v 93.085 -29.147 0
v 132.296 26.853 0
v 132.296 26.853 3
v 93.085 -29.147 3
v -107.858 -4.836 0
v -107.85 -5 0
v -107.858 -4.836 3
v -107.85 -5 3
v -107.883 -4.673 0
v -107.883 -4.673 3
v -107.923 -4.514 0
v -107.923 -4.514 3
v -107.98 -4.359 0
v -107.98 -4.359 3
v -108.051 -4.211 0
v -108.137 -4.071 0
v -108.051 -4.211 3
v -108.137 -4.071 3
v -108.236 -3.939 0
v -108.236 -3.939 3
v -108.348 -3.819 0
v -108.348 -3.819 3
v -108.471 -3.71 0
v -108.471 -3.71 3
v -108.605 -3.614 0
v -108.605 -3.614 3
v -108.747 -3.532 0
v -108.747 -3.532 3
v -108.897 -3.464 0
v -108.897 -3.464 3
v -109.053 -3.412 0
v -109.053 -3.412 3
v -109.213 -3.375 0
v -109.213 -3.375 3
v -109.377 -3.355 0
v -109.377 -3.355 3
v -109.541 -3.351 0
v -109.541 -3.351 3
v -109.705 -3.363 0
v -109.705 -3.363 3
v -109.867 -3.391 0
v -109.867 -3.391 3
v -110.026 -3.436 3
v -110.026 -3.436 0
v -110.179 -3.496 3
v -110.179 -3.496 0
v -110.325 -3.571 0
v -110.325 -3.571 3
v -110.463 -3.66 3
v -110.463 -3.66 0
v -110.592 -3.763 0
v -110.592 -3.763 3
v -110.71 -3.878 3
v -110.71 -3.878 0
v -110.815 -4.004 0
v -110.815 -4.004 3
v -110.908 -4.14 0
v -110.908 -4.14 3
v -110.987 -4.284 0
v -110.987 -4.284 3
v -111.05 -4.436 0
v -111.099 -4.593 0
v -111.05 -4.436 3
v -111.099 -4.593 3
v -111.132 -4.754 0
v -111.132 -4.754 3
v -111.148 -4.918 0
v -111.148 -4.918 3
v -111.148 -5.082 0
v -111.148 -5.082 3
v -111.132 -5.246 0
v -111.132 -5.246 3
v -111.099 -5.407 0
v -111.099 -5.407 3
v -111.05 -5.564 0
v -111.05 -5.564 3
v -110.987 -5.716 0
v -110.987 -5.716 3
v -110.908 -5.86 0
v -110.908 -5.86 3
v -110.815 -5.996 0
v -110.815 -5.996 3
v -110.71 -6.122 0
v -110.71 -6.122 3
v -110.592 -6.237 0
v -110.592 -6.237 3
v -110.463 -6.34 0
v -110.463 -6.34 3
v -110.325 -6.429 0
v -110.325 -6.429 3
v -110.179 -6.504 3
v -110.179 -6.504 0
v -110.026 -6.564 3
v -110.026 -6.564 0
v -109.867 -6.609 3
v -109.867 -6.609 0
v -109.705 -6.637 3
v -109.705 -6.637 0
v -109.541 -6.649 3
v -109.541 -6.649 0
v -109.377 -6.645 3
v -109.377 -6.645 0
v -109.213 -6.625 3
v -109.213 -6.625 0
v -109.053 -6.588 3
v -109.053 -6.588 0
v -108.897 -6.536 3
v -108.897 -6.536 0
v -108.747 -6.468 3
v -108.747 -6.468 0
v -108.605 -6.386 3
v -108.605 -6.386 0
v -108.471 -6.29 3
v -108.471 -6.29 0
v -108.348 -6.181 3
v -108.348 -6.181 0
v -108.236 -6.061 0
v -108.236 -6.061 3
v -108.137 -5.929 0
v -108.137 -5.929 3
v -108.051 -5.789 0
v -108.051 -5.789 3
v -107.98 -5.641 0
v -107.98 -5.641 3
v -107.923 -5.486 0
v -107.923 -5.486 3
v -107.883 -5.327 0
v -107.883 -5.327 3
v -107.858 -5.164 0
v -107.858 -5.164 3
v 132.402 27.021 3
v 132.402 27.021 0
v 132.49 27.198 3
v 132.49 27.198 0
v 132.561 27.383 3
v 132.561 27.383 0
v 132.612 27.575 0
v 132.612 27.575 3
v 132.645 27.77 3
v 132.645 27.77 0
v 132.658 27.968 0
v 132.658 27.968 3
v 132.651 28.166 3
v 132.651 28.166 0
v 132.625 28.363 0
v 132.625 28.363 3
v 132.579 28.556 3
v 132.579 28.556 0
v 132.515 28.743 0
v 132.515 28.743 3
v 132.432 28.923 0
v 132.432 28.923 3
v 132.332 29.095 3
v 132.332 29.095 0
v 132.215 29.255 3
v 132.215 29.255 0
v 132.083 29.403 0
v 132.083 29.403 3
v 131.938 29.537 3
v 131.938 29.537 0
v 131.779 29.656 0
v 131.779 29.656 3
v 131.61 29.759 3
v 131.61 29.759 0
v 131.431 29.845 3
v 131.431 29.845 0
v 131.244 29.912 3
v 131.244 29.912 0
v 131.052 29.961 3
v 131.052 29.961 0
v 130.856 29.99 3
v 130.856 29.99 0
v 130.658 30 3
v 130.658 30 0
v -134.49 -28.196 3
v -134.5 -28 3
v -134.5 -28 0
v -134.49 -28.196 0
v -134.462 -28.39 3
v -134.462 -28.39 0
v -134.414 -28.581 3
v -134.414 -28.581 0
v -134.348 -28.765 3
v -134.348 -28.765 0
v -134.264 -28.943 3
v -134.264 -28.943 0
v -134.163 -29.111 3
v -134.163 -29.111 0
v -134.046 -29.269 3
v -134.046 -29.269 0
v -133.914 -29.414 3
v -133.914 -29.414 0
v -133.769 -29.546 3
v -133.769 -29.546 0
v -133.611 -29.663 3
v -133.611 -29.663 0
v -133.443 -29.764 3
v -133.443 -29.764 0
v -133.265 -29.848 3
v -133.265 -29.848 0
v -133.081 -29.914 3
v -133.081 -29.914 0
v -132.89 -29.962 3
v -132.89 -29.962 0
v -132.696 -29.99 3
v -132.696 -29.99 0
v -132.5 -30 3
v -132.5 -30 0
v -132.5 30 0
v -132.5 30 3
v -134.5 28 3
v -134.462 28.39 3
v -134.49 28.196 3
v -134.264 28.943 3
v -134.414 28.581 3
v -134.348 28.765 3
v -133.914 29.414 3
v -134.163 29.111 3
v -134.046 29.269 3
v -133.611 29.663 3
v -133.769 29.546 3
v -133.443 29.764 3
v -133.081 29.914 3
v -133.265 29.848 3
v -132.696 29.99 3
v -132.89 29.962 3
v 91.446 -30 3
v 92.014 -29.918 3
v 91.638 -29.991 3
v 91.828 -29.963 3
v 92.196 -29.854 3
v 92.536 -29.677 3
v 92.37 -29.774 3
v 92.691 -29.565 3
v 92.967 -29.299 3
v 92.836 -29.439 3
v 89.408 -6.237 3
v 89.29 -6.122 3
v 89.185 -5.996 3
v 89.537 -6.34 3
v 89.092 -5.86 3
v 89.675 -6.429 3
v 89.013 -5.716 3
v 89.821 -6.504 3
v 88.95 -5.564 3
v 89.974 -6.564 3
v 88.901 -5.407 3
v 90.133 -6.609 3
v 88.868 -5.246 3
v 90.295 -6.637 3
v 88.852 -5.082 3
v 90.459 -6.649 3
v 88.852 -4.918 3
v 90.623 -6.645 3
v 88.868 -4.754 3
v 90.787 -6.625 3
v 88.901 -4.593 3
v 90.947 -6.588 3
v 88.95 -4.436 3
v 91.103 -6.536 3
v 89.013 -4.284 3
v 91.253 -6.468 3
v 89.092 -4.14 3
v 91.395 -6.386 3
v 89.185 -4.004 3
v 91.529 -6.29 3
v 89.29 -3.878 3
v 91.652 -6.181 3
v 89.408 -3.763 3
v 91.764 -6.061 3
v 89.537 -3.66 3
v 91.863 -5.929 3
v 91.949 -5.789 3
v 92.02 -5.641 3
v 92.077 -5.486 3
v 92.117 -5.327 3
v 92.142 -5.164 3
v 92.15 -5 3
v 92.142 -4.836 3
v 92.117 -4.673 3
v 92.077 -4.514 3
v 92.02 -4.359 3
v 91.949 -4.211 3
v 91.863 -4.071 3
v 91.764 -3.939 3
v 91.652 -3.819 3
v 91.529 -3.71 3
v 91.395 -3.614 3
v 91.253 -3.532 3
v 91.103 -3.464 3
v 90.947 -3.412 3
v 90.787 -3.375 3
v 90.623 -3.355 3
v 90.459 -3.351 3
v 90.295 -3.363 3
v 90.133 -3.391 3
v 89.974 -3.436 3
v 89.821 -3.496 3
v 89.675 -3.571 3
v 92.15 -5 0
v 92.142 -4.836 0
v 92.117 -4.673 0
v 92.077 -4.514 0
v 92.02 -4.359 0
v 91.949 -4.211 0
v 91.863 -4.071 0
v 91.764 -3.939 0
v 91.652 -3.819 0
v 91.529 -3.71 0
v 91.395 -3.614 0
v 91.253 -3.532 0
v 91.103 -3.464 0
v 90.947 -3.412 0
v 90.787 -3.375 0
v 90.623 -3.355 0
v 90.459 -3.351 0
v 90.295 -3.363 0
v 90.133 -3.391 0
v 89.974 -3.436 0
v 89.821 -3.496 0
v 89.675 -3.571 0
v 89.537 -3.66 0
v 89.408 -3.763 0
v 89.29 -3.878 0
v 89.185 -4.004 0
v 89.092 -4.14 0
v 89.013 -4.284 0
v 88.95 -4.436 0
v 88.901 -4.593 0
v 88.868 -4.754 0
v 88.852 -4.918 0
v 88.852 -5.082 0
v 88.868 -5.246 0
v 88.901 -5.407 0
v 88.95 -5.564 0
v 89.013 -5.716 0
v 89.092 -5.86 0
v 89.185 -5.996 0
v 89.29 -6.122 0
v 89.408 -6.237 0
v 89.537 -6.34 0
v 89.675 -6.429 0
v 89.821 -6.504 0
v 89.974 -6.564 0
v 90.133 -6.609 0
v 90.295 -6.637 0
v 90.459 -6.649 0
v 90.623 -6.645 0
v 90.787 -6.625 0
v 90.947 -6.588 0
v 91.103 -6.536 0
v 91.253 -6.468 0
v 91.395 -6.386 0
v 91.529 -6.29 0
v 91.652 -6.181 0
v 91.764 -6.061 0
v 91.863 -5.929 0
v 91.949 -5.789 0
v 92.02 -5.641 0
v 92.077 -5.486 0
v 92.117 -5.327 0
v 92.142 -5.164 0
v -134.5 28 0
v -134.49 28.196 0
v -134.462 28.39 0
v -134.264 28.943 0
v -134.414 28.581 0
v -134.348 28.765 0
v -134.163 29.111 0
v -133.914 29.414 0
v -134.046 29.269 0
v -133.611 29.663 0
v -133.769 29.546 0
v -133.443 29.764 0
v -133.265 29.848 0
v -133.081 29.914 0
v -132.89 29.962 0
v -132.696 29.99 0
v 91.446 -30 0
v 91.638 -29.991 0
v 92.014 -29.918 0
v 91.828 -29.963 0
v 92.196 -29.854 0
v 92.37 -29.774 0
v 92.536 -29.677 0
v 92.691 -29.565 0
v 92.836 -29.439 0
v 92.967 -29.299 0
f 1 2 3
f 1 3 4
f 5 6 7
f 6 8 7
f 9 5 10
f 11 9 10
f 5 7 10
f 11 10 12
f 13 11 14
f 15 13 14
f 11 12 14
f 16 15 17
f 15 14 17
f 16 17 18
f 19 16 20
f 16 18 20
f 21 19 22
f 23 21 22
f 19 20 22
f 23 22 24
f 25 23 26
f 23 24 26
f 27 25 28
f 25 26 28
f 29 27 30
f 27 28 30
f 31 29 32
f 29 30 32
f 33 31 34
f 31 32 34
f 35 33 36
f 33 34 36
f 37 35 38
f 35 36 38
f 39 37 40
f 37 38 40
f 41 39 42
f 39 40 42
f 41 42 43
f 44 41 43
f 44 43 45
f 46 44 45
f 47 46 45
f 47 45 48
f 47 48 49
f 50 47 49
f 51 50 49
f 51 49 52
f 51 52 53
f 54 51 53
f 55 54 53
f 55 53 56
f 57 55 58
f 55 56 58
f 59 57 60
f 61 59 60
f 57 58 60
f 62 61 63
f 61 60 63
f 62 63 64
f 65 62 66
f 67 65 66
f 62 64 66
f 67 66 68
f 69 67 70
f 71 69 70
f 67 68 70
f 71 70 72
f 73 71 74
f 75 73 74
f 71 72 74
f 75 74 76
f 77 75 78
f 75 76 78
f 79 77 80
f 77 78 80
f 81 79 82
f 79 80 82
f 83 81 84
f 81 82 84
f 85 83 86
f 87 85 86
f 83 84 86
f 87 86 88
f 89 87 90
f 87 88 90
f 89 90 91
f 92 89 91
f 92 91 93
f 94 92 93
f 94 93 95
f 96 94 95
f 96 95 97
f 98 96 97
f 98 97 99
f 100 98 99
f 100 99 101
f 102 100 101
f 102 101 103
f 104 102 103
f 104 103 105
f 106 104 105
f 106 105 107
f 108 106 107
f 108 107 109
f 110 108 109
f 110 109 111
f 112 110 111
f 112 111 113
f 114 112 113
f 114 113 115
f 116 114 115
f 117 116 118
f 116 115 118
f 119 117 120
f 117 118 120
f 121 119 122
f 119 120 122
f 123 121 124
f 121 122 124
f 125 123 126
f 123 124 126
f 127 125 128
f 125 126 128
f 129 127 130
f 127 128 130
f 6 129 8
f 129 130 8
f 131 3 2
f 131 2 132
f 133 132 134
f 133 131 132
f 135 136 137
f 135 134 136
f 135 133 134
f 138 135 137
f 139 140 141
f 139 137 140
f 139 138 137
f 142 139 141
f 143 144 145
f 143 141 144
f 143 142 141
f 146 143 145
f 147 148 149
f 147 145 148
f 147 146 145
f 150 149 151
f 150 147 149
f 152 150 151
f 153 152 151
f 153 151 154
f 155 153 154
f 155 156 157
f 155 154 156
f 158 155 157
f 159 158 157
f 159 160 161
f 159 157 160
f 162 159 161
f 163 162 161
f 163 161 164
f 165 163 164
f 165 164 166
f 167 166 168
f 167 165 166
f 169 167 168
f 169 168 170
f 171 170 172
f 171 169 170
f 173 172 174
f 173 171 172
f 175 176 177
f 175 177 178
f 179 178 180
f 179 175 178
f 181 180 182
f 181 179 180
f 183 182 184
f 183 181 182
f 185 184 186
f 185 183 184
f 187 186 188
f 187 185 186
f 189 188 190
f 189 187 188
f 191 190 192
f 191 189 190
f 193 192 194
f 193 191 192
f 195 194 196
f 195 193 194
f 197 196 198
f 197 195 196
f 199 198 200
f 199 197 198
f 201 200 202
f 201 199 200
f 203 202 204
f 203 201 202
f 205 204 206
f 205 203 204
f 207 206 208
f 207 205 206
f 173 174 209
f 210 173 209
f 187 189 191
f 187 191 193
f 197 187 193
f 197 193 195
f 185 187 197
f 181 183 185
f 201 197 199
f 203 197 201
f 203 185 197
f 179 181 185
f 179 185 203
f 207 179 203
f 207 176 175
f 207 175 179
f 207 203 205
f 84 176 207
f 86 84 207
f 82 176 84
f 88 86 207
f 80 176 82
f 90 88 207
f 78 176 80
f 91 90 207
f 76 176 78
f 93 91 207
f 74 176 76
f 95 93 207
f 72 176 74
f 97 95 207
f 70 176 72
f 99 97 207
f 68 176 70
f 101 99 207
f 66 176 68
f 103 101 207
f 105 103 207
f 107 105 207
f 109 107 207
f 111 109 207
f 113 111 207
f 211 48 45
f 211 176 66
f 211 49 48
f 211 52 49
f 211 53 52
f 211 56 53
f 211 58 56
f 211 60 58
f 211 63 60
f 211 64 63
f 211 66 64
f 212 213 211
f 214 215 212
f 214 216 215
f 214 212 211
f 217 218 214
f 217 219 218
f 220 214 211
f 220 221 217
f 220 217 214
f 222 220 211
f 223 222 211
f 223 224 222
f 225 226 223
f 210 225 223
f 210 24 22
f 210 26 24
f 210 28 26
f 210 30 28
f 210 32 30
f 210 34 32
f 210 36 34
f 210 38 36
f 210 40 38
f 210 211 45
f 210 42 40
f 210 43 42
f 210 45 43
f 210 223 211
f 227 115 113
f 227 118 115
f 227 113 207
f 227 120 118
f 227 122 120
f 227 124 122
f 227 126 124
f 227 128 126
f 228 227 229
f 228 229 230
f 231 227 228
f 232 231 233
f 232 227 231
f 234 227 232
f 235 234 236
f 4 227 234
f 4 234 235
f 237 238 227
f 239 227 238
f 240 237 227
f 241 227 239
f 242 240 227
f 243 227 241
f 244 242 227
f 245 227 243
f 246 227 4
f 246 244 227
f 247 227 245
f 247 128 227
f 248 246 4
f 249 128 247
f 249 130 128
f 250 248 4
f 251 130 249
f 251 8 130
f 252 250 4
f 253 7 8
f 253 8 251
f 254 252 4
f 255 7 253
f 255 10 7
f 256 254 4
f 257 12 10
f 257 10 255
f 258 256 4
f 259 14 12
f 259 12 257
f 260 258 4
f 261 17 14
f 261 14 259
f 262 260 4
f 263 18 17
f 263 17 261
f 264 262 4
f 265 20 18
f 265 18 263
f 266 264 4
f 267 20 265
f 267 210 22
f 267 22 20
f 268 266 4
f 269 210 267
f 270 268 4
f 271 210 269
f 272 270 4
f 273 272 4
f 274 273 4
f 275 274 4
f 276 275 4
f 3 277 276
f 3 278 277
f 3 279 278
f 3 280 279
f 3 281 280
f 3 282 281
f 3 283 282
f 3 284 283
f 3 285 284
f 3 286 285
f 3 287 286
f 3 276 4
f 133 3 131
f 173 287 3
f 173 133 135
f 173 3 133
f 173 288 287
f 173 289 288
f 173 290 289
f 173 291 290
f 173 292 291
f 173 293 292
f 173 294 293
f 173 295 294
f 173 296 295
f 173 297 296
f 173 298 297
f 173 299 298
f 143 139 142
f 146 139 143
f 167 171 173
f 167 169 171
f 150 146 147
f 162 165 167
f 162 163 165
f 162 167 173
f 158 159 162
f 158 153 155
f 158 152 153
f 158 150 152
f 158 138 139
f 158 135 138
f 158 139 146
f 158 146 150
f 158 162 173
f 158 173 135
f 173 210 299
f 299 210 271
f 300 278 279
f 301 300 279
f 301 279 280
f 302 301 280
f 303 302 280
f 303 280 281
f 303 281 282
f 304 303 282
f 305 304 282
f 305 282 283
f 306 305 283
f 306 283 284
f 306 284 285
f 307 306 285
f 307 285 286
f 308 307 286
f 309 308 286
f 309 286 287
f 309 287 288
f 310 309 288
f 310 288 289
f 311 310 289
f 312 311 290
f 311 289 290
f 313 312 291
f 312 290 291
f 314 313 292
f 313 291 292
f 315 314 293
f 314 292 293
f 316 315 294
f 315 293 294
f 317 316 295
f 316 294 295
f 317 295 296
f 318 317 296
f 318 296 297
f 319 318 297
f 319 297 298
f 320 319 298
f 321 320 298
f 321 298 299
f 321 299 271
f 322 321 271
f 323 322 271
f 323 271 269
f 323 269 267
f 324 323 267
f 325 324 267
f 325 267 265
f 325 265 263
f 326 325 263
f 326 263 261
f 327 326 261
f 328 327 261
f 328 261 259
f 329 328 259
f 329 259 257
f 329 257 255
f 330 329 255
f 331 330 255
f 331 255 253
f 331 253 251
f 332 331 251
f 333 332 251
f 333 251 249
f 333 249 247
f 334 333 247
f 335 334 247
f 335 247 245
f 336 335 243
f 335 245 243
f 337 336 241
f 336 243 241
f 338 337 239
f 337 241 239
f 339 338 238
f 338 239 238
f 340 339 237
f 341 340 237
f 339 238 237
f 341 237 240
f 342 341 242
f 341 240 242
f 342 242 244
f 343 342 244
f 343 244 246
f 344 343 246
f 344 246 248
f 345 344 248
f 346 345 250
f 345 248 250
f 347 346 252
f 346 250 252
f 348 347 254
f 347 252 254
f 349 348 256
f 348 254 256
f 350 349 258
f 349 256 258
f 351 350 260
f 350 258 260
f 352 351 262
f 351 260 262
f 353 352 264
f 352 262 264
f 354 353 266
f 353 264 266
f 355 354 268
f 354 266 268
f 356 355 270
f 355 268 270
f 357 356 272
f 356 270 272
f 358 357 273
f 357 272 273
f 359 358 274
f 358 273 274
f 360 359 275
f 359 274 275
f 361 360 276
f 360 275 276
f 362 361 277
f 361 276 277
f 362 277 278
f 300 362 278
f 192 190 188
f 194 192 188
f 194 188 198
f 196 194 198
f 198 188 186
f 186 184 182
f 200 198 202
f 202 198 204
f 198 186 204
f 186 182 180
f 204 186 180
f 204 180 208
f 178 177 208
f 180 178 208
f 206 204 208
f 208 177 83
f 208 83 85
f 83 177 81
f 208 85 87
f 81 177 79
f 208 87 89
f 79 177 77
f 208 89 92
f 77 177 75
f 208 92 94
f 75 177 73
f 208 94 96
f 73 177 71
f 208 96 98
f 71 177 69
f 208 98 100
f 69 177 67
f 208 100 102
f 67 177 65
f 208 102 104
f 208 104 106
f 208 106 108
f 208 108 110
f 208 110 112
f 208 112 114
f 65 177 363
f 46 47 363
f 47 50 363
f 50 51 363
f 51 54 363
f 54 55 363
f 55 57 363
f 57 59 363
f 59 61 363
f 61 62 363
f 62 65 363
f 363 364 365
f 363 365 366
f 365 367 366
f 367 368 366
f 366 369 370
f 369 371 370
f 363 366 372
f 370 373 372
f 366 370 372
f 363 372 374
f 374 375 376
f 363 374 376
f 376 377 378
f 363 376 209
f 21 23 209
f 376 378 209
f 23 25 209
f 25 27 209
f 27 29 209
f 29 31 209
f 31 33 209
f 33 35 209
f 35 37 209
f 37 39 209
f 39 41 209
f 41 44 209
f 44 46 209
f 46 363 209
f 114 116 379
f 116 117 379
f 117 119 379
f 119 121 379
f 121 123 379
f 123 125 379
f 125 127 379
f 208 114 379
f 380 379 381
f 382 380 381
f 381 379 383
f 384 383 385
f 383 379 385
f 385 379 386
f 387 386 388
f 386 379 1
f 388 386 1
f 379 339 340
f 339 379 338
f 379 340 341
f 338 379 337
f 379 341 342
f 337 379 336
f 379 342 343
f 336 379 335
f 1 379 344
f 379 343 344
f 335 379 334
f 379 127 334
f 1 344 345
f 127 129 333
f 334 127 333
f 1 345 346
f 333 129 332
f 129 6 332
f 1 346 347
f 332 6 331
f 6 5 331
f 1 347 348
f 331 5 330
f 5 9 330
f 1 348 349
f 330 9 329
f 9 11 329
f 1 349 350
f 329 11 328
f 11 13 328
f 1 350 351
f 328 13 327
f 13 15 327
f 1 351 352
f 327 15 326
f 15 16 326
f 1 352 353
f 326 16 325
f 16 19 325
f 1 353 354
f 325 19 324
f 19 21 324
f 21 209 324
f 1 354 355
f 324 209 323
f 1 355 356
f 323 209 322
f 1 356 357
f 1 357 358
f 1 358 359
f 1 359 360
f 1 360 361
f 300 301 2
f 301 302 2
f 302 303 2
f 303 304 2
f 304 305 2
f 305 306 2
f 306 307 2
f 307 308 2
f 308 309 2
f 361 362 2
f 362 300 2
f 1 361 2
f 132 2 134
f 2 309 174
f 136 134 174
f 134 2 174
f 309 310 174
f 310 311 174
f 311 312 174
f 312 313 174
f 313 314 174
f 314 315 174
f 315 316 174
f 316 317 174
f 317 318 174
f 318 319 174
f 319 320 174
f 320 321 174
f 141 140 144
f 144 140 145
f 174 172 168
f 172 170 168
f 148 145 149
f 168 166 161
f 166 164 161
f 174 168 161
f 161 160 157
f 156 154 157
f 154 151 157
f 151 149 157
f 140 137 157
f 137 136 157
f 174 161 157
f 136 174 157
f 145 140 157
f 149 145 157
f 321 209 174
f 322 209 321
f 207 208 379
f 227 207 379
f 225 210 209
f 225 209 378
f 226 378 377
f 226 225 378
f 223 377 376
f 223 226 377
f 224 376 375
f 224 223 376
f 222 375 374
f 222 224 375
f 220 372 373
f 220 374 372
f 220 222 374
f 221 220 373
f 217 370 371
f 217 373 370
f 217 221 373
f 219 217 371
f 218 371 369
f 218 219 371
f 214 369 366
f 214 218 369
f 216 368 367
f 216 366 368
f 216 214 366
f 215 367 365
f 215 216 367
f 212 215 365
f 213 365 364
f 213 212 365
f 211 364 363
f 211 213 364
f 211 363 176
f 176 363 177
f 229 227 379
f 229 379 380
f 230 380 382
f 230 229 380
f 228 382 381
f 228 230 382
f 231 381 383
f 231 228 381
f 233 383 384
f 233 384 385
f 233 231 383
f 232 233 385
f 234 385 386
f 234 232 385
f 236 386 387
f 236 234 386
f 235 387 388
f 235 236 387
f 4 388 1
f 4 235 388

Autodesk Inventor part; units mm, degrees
ref_plane "YZ Plane" through (0, 0, 0) normal (1, 0, 0) x (0, 1, 0)
ref_plane "XZ Plane" through (0, 0, 0) normal (0, 1, 0) x (-1, 0, 0)
ref_plane "XY Plane" through (0, 0, 0) normal (0, 0, 1) x (1, 0, 0)
sketch "Sketch1" plane through (0, 0, 0) normal (0, 0, 1) x (1, 0, 0)
  line L0 (-134.5, -30) -> (134.5, -30)
  line L1 (134.5, -30) -> (134.5, 30)
  line L2 (134.5, 30) -> (-134.5, 30)
  line L3 (-134.5, 30) -> (-134.5, -30)
  line L4 (-134.5, -30) -> (134.5, 30) construction
  line L5 (134.5, -30) -> (-134.5, 30) construction
  line L6 (134.5, 30) -> (92.4875, -30)
  point P0 (0, 0)
  dimension "d0" = 269
  dimension "d1" = 60
  dimension "d2" = 55
extrude "Extrusion1" add sketch "Sketch1" along normal blind 3 contours L3 L2 L6 L0
sketch "Sketch2" plane through (0, 0, 3) normal (0, 0, 1) x (1, 0, 0)
  circle A0 centre (-109.5, -5) radius 1.65
  line L0 (-134.5, -30) -> (92.4875, -30) projected
  line L1 (-134.5, 30) -> (-134.5, -30) projected
  line L2 (-109.5, -5) -> (151.1099, -5) construction
  circle A1 centre (90.5, -5) radius 1.65
  point P0 (0, 0)
  dimension "d5" = 25
  dimension "d6" = 3.3
  dimension "d7" = 25
  dimension "d8" = 225
  dimension "d9" = 3.3
extrude "Extrusion2" cut sketch "Sketch2" against normal through all
fillet "Fillet1" radius 2 4 edges at (-134.5, 30, 1.5) (-134.5, -30, 1.5) (92.4875, -30, 1.5) (134.5, 30, 1.5)
sketch "Sketch3" plane through (0, 0, 3) normal (0, 0, 1) x (1, 0, 0)
  arc A0 (132.2963, 26.8528) -> (130.658, 30) centre (130.658, 28) ccw projected
  line L0 (130.658, 30) -> (-132.5, 30) projected
  arc A1 (-132.5, 30) -> (-134.5, 28) centre (-132.5, 28) ccw projected
  line L1 (-134.5, 28) -> (-134.5, -28) projected
  arc A2 (-134.5, -28) -> (-132.5, -30) centre (-132.5, -28) ccw projected
  line L2 (-132.5, -30) -> (91.4464, -30) projected
  arc A3 (91.4464, -30) -> (93.0847, -29.1472) centre (91.4464, -28) ccw projected
  line L3 (93.0847, -29.1472) -> (132.2963, 26.8528) projected
  circle A4 centre (90.5, -5) radius 1.65 projected
  circle A5 centre (-109.5, -5) radius 1.65 projected
  point P0 (0, 0)
equation "\"d9\" = d6"
properties part number "UpperAcrylicSheetSide"
